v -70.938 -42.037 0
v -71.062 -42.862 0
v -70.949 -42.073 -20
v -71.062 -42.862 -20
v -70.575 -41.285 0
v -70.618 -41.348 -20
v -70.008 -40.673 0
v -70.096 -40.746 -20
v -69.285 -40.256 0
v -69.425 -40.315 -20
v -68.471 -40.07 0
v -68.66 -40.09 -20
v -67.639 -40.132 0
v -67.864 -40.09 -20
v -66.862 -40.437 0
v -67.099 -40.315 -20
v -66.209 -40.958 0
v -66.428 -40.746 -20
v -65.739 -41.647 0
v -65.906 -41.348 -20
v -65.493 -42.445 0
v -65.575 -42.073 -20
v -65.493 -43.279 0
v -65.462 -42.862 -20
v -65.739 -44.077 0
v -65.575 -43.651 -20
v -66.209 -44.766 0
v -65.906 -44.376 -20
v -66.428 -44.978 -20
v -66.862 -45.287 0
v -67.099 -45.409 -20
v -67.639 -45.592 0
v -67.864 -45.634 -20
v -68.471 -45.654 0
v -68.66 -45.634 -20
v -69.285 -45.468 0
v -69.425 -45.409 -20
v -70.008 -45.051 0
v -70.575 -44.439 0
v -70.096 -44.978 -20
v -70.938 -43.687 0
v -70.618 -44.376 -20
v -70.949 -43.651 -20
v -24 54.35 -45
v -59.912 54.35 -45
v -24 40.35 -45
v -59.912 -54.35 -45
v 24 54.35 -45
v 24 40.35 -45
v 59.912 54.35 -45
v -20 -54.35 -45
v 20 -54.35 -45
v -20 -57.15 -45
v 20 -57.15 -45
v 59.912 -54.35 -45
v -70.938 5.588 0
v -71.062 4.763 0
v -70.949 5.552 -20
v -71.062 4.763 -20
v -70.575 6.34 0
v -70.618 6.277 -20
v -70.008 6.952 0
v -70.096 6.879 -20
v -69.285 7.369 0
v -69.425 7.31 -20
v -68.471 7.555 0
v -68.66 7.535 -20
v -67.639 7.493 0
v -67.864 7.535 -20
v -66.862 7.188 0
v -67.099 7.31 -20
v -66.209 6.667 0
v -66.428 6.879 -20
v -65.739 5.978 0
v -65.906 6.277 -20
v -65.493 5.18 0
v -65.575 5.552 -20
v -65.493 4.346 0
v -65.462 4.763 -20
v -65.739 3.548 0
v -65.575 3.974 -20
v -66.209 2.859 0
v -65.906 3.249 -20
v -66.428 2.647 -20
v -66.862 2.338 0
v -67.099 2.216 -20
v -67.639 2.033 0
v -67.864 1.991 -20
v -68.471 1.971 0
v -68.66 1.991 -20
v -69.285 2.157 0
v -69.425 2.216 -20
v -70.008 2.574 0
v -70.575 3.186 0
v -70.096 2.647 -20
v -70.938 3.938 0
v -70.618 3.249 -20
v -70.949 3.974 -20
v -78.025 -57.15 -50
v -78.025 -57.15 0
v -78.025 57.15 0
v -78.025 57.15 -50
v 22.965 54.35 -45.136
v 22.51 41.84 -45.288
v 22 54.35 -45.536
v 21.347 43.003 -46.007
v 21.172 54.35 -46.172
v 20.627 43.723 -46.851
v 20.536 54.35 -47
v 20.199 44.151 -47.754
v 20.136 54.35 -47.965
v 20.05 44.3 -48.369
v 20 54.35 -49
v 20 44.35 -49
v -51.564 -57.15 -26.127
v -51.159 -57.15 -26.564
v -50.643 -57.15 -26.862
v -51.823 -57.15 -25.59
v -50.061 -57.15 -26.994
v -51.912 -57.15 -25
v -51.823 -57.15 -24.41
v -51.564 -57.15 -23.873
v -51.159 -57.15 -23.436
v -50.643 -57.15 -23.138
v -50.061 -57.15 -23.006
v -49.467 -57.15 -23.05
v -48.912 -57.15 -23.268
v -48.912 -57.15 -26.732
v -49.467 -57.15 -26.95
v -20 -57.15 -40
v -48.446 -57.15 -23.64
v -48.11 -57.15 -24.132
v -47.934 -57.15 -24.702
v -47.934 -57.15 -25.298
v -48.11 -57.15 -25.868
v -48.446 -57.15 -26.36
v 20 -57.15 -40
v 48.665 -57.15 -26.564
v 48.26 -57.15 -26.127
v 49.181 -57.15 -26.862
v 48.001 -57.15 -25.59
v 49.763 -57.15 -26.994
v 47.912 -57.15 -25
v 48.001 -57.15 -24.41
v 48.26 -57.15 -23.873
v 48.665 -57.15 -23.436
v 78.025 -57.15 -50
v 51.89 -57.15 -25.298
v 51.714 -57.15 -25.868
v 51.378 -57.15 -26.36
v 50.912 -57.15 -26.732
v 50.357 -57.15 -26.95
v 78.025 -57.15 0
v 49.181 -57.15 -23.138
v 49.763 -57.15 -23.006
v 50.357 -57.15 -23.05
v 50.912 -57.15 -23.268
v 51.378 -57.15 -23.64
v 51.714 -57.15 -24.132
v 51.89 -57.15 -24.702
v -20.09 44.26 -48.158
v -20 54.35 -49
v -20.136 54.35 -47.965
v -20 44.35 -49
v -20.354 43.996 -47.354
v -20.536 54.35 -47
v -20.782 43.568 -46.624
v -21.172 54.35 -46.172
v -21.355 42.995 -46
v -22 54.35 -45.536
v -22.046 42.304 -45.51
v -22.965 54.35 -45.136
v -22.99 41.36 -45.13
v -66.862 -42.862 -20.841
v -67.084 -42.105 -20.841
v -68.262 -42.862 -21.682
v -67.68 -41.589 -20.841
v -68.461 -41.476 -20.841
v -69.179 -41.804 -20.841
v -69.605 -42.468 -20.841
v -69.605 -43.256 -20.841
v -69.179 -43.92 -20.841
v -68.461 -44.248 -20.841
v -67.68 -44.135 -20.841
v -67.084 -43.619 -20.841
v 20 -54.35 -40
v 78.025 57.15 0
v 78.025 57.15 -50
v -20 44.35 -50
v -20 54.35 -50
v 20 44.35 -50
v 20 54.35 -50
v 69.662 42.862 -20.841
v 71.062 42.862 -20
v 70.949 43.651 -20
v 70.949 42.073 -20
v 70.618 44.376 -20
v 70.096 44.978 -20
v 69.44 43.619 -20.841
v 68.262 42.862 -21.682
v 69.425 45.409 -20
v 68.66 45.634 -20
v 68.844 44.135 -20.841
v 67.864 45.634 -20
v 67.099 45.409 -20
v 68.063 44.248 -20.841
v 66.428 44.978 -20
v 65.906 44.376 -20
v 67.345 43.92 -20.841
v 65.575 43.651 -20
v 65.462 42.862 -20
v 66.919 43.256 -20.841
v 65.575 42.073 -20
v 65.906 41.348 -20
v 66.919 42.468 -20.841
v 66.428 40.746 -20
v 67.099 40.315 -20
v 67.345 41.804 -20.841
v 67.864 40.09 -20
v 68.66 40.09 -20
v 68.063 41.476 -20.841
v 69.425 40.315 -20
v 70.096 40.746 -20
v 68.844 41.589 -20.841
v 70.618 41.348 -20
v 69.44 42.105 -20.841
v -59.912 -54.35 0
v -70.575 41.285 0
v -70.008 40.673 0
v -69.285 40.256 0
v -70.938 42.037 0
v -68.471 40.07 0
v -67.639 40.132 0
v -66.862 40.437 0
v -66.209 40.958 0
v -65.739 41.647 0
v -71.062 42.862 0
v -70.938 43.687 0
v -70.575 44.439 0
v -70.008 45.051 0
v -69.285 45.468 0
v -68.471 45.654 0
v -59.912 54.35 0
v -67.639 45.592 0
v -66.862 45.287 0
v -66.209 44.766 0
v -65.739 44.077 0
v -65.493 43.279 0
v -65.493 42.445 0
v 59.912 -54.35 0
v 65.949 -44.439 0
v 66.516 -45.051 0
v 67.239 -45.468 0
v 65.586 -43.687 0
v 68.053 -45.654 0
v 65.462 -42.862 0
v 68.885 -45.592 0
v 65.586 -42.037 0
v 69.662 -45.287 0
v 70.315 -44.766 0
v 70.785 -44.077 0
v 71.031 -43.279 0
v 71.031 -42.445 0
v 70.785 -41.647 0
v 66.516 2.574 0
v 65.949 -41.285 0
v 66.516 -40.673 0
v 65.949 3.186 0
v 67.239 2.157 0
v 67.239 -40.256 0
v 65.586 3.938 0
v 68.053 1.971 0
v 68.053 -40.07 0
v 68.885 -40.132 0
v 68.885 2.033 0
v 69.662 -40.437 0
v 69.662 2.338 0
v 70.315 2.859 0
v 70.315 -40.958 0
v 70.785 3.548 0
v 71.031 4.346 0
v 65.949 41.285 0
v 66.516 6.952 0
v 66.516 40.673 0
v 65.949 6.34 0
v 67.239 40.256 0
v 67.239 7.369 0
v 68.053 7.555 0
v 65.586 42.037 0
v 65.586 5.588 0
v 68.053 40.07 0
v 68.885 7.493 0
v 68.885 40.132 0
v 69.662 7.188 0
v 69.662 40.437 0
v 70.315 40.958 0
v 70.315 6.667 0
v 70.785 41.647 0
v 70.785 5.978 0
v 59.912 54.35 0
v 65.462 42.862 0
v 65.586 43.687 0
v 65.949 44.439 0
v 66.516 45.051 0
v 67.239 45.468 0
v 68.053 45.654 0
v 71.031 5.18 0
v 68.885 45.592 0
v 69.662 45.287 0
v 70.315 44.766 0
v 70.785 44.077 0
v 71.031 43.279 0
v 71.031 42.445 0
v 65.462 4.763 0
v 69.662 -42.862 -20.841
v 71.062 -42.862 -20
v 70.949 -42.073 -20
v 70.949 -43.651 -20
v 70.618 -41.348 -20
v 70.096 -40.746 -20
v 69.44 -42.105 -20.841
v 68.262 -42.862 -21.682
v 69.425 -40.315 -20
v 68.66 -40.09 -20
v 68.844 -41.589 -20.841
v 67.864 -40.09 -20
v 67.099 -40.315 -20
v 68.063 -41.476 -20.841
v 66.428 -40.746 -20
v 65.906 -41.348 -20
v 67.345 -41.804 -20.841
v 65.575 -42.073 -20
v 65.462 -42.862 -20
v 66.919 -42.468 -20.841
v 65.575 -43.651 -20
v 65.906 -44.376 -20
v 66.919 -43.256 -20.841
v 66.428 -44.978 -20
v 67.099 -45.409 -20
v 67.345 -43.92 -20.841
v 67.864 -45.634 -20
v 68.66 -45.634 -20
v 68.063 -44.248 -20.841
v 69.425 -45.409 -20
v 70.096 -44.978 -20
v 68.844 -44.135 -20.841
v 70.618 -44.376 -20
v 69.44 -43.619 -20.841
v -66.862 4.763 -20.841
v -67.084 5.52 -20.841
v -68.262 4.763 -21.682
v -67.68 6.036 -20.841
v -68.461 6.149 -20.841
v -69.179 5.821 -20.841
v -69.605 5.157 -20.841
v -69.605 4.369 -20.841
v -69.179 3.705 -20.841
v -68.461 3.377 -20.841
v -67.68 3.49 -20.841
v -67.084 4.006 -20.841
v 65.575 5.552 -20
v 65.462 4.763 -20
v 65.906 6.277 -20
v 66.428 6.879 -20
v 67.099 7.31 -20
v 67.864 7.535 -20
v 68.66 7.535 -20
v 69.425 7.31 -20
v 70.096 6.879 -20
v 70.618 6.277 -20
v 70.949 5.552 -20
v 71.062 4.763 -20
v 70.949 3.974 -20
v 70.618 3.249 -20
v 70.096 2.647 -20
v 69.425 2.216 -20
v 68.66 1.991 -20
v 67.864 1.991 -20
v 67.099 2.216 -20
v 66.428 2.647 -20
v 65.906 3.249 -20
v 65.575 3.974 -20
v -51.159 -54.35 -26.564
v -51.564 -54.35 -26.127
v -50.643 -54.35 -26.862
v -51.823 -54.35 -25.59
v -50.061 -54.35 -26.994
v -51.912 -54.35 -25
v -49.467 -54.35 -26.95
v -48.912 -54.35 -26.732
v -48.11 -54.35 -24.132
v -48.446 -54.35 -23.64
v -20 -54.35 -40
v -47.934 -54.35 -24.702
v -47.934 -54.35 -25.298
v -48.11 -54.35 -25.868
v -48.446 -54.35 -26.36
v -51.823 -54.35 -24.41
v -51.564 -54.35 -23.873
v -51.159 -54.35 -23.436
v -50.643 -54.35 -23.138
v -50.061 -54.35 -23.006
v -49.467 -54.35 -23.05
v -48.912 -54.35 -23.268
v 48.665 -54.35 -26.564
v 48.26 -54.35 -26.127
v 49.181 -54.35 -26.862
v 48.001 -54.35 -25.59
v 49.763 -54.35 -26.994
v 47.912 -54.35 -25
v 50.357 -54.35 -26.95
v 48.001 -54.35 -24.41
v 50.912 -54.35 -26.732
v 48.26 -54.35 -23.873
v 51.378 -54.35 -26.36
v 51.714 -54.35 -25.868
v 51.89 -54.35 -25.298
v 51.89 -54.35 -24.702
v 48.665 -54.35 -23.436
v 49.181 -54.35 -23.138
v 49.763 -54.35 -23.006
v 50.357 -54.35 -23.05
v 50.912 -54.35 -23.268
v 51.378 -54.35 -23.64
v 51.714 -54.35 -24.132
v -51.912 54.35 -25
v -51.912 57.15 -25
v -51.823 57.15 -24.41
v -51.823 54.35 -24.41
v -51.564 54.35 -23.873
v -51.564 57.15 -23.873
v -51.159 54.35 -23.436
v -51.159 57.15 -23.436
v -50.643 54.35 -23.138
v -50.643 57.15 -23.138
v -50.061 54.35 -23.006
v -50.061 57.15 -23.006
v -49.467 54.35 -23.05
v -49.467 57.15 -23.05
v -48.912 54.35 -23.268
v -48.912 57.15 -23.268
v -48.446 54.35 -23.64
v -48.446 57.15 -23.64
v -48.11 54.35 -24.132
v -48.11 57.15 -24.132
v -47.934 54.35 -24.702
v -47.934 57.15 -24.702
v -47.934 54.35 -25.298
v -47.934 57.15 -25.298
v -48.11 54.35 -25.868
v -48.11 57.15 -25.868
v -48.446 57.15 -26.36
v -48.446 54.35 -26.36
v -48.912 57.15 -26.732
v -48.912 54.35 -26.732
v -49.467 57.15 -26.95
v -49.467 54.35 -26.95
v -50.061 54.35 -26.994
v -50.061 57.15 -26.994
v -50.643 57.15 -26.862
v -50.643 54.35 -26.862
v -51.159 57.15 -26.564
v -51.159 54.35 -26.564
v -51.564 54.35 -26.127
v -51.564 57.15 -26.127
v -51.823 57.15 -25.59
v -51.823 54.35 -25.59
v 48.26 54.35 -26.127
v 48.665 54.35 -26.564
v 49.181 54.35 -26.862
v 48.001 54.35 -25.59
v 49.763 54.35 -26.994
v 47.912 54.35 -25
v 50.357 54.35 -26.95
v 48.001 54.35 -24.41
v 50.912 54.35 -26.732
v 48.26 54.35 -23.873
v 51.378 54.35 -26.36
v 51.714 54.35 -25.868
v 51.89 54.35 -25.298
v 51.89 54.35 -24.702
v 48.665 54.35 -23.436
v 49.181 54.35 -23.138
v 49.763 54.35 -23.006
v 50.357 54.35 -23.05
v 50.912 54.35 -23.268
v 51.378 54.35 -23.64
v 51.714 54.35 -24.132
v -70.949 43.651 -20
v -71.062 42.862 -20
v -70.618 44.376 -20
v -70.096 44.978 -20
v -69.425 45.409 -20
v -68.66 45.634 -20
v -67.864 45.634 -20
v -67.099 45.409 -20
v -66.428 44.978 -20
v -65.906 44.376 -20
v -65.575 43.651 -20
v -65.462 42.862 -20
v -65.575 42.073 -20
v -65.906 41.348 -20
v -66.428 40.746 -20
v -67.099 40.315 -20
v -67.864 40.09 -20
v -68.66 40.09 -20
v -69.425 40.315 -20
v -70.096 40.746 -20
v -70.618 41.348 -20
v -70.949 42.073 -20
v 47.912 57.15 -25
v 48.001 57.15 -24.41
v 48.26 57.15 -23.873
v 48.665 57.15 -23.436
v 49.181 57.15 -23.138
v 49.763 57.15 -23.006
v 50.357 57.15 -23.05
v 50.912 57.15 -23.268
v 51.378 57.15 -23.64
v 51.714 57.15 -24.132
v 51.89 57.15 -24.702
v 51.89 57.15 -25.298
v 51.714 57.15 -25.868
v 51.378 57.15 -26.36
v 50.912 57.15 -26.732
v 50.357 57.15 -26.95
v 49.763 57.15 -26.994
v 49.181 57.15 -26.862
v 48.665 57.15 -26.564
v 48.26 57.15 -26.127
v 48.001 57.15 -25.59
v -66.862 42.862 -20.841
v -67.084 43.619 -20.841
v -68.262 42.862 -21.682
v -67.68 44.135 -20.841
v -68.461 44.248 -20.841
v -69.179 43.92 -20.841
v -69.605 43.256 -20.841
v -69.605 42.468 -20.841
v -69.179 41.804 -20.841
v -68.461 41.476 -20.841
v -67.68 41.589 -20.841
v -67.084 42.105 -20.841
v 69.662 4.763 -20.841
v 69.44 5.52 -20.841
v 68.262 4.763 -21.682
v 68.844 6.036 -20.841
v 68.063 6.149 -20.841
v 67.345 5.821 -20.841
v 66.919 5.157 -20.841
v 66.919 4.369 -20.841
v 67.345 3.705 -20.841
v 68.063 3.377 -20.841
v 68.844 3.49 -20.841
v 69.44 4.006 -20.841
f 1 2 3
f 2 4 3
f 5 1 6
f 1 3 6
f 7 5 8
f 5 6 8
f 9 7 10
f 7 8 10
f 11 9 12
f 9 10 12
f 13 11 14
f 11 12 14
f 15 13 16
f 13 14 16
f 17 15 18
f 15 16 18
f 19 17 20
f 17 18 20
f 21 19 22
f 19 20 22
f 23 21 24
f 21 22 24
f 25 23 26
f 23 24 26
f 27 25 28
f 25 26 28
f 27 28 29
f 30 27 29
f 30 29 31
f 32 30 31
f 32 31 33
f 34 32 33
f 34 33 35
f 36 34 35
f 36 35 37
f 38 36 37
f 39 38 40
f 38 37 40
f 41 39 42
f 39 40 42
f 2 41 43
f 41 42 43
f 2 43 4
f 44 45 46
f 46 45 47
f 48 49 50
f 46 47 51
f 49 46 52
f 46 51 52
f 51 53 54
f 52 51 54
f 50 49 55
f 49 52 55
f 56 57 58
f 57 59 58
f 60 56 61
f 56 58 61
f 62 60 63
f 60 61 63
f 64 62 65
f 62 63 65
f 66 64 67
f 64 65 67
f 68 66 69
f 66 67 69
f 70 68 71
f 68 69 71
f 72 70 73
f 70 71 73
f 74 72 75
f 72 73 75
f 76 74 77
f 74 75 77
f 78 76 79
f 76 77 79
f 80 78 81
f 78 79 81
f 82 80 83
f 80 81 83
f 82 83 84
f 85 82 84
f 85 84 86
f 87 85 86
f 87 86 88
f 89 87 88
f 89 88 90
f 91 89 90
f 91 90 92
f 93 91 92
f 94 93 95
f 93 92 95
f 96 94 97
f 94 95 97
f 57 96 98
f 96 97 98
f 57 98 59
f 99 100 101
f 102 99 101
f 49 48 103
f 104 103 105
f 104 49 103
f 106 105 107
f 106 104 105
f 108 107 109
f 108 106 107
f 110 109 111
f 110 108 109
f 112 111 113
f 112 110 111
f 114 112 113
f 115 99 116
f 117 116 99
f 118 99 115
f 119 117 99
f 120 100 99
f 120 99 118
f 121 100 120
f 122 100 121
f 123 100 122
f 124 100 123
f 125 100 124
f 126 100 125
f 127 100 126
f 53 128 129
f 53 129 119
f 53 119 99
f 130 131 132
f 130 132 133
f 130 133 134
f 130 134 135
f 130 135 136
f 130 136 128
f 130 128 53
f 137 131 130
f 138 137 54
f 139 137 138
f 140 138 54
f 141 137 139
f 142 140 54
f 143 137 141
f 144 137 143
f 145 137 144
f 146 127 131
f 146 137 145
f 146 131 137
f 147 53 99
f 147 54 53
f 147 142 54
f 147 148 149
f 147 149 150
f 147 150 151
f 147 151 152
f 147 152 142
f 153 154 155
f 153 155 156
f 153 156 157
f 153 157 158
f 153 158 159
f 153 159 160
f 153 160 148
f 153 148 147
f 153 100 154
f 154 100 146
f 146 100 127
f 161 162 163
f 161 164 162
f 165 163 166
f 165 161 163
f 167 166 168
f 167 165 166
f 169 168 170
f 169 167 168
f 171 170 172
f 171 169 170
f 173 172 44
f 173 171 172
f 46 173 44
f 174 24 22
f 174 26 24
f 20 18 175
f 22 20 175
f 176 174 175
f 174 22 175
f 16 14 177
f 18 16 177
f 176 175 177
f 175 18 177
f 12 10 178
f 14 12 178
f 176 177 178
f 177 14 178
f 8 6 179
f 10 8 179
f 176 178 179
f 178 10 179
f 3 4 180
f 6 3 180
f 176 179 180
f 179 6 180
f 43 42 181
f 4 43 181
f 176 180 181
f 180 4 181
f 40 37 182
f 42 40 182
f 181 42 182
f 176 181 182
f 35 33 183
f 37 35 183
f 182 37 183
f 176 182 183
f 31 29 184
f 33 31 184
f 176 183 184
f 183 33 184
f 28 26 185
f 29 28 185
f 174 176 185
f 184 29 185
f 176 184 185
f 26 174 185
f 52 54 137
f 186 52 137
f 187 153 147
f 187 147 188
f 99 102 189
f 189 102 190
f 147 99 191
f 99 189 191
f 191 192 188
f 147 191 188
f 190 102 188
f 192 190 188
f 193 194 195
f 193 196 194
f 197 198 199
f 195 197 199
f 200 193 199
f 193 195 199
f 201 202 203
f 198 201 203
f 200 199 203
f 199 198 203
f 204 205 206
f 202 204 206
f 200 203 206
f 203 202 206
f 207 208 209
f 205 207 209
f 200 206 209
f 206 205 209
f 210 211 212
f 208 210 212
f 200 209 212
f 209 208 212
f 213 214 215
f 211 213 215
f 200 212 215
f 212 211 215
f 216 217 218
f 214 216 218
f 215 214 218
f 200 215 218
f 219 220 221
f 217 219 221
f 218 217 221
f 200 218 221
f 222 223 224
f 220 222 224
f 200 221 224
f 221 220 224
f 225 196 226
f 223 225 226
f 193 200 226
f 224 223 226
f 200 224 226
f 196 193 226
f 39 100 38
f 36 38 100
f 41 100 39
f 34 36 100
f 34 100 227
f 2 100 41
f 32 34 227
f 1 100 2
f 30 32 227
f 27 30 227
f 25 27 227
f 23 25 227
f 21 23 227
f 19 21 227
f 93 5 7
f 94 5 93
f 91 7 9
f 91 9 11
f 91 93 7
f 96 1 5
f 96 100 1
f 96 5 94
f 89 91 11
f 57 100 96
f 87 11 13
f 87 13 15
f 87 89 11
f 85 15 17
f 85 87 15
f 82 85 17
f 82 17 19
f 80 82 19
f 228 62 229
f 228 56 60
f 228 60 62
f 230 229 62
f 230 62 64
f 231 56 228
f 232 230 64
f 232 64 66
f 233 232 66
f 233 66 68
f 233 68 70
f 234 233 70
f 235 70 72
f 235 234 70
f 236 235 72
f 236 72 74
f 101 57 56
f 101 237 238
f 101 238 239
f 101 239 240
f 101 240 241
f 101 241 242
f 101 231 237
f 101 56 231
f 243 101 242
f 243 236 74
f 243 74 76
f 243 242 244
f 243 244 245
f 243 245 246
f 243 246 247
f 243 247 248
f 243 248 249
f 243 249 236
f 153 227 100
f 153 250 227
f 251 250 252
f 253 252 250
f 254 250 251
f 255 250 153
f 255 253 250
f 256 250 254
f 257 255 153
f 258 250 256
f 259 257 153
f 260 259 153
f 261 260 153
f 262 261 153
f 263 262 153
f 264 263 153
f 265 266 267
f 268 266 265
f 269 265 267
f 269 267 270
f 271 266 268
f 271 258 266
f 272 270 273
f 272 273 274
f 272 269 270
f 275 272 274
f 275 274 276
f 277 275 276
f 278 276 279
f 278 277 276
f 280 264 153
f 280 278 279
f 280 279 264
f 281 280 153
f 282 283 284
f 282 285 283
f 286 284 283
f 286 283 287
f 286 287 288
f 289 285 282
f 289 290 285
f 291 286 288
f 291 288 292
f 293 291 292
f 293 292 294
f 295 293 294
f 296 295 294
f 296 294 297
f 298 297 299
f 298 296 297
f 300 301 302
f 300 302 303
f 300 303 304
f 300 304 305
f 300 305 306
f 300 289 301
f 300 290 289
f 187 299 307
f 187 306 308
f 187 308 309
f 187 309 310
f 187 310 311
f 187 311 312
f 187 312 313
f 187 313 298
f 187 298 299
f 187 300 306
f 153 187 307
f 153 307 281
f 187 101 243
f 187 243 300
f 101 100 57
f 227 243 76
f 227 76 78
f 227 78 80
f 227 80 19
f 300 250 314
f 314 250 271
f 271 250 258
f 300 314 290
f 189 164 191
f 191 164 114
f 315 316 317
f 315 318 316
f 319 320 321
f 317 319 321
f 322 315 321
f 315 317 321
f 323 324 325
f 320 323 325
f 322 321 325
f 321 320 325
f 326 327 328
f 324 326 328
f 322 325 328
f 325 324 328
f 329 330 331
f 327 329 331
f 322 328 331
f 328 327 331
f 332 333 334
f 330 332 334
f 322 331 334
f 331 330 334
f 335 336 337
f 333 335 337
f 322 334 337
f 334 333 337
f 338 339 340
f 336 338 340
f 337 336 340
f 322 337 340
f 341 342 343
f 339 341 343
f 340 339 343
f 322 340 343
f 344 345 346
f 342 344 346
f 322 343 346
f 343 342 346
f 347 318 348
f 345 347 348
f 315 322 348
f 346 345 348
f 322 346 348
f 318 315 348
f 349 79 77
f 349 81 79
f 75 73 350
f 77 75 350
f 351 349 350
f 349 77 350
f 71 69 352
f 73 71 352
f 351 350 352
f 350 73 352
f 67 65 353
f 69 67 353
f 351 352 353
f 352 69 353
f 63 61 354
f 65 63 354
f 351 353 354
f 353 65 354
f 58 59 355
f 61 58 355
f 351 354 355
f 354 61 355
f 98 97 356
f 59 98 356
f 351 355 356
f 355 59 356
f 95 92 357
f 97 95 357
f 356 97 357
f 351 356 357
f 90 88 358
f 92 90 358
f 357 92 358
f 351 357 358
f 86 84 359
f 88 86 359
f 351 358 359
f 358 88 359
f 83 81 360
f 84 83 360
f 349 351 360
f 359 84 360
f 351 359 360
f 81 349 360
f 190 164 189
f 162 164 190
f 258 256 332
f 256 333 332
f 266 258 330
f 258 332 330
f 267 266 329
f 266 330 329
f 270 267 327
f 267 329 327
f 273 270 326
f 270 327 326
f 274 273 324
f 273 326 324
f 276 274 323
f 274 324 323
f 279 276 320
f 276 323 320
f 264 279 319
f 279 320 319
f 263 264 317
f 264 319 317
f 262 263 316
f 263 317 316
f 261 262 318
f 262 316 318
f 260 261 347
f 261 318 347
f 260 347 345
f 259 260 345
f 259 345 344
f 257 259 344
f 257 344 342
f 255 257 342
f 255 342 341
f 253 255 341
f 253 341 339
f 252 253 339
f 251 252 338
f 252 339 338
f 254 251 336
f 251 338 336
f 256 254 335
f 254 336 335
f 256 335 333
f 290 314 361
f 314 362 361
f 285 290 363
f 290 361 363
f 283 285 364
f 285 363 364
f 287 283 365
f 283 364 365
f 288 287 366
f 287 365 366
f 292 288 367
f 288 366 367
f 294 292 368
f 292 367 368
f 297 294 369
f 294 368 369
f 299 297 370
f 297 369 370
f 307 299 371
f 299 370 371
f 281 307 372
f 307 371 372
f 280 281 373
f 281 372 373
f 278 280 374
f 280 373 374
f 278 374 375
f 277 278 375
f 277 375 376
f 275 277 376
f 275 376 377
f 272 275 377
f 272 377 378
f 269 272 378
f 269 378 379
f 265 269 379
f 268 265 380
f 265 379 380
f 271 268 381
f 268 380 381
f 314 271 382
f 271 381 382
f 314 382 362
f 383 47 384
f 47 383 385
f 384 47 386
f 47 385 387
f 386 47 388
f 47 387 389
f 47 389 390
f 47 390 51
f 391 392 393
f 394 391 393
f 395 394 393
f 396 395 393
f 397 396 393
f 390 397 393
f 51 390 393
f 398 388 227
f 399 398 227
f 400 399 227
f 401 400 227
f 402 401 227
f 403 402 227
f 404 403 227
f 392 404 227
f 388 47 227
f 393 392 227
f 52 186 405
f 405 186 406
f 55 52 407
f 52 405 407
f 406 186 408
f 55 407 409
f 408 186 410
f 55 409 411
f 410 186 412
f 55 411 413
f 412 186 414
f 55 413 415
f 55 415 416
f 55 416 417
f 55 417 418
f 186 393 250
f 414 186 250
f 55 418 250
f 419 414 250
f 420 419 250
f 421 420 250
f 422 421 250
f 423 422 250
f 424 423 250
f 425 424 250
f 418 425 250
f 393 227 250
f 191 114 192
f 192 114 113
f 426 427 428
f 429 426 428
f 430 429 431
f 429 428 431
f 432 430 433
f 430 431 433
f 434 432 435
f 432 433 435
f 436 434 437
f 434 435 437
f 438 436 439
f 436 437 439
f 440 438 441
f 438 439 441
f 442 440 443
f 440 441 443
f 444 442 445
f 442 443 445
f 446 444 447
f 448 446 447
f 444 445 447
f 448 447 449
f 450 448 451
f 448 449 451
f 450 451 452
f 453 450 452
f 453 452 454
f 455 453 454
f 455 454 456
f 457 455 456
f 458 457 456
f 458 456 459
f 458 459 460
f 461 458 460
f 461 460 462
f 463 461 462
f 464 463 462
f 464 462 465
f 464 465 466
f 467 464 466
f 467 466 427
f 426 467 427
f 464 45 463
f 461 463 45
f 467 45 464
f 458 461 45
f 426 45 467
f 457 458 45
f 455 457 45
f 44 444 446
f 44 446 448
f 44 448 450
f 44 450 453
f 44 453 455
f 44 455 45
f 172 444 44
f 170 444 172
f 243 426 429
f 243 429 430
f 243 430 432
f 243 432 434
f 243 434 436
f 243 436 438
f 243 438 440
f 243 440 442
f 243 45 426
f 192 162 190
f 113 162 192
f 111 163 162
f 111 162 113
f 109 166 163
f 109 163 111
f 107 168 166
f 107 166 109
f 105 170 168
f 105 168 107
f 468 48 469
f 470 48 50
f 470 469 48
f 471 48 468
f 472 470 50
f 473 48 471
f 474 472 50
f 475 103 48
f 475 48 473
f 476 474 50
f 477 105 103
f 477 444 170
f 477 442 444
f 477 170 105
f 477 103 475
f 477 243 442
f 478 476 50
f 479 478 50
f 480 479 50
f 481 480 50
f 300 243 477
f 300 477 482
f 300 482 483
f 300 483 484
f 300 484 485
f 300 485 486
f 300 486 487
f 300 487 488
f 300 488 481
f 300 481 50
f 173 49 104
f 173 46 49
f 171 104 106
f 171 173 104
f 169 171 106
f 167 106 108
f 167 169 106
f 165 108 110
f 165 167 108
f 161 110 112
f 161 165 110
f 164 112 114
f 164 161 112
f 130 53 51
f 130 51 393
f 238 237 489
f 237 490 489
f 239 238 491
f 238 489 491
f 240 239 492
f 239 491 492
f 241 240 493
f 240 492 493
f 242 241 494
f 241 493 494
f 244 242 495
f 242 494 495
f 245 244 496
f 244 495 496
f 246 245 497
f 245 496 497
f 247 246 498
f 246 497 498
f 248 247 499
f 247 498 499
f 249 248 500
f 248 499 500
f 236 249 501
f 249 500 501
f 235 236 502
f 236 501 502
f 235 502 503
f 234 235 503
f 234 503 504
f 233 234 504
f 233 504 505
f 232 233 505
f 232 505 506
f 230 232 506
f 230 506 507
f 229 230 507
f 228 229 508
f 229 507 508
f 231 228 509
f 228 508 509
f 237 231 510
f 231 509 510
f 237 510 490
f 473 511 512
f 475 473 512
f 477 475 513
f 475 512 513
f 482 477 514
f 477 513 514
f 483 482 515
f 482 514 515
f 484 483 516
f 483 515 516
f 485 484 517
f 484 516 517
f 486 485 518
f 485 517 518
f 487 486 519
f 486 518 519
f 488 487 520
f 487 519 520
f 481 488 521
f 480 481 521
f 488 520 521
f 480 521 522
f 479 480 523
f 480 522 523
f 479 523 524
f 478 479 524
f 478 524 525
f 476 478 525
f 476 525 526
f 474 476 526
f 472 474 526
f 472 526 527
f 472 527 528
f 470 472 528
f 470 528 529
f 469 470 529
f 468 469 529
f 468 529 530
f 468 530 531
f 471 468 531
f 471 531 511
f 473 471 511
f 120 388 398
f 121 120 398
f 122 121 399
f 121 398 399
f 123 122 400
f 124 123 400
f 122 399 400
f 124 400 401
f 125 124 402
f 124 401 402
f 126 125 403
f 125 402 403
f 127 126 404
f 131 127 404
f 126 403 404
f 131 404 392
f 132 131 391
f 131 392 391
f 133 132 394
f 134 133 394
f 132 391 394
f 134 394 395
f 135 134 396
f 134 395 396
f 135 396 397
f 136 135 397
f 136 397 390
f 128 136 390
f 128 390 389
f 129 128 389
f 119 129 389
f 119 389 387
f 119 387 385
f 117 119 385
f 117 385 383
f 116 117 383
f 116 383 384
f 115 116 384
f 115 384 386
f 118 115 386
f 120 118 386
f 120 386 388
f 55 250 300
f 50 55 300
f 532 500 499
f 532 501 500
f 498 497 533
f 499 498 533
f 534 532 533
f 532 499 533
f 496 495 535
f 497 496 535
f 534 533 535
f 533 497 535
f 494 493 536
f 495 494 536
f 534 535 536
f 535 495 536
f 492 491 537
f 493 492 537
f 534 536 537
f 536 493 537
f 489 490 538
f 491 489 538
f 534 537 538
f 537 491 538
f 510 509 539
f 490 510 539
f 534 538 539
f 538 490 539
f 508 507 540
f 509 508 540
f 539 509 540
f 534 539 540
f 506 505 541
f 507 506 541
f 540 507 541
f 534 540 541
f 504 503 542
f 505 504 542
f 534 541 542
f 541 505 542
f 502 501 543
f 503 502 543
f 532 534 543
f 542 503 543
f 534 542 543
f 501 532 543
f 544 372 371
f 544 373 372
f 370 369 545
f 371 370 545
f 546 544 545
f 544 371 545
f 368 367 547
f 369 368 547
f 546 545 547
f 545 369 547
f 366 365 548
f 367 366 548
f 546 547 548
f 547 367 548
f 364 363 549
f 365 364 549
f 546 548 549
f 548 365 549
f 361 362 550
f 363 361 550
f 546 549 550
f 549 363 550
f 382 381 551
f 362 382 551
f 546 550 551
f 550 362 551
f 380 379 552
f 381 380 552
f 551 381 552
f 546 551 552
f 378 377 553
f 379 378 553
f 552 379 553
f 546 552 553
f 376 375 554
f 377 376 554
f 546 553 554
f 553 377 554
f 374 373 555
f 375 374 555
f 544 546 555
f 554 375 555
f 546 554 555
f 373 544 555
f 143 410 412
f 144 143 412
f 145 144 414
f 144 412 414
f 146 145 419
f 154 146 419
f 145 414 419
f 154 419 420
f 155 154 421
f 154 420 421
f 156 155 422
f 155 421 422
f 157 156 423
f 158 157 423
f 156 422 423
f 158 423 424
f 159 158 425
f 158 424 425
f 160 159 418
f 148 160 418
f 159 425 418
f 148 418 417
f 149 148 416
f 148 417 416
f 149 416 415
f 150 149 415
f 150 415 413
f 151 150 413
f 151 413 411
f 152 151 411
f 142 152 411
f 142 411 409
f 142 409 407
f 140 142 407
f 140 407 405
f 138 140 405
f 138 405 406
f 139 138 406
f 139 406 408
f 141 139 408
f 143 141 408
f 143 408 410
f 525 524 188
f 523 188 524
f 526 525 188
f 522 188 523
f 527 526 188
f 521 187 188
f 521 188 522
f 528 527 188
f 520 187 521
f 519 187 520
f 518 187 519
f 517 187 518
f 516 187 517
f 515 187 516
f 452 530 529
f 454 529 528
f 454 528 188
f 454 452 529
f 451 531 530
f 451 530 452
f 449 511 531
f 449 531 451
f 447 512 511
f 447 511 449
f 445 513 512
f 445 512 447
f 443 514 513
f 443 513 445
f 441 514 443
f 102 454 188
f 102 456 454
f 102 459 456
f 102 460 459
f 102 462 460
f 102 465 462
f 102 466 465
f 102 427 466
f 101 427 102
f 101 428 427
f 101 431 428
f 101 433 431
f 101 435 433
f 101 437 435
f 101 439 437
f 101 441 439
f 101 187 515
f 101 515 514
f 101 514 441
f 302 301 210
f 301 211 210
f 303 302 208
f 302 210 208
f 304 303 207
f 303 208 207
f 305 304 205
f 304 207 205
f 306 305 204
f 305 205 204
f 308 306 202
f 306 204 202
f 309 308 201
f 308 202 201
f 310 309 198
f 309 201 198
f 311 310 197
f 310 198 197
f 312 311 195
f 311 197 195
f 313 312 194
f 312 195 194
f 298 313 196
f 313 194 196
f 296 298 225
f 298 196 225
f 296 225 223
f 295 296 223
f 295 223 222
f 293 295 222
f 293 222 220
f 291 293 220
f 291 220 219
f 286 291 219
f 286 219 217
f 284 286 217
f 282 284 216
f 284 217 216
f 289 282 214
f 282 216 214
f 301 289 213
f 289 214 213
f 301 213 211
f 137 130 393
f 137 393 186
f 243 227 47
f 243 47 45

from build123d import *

# Parameters (mm, degrees)
F0_W     = 146.05
F0_H     = 114.3
F0_R     = 3.24
F0_W_2   = 5
F1_DEPTH = 50
F2_W     = 119.824
F2_H     = 108.7
F3_DEPTH = 45
F4_D     = 5.6
F4_DEPTH = 20
F4_TIP   = 1.6824097333
F5_W     = 40
F5_H     = 5
F6_DEPTH = 2.8
F7_D     = 4
F8_W     = 40
F8_H     = 10
F9_DEPTH = 50.001
F10_R    = 4


with BuildPart() as f1:
    # F0 (on Top) → F1 (new body)
    with BuildSketch(Plane.XY):
        Rectangle(F0_W, F0_H)
        with Locations((-68.262, -42.862)):
            Circle(F0_R, mode=Mode.SUBTRACT)
        with Locations((68.262, -42.862)):
            Circle(F0_R, mode=Mode.SUBTRACT)
        with Locations((-68.262, 4.763)):
            Circle(F0_R, mode=Mode.SUBTRACT)
        with BuildLine():
            Line((-72.225, -1.587), (-68.262, -1.587))
            ThreePointArc((-68.262, -1.587), (-61.912, 4.763), (-68.262, 11.113))
            Line((-68.262, 11.113), (-72.225, 11.113))
            Line((-72.225, 11.113), (-72.225, 36.512))
            Line((-72.225, 36.512), (-68.262, 36.512))
            ThreePointArc((-68.262, 36.512), (-61.912, 42.862), (-68.262, 49.212))
            Line((-68.262, 49.212), (-72.225, 49.212))
            Line((-72.225, 49.212), (-72.225, 56.35))
            Line((-72.225, 56.35), (72.225, 56.35))
            Line((72.225, 56.35), (72.225, 49.212))
            Line((72.225, 49.212), (68.262, 49.212))
            ThreePointArc((68.262, 49.212), (61.912, 42.862), (68.262, 36.512))
            Line((68.262, 36.512), (72.225, 36.512))
            Line((72.225, 36.512), (72.225, 11.113))
            Line((72.225, 11.113), (68.262, 11.113))
            ThreePointArc((68.262, 11.113), (61.912, 4.763), (68.262, -1.587))
            Line((68.262, -1.587), (72.225, -1.587))
            Line((72.225, -1.587), (72.225, -36.512))
            Line((72.225, -36.512), (68.262, -36.512))
            ThreePointArc((68.262, -36.512), (61.912, -42.862), (68.262, -49.212))
            Line((68.262, -49.212), (72.225, -49.212))
            Line((72.225, -49.212), (72.225, -56.35))
            Line((72.225, -56.35), (-72.225, -56.35))
            Line((-72.225, -56.35), (-72.225, -49.212))
            Line((-72.225, -49.212), (-68.262, -49.212))
            ThreePointArc((-68.262, -49.212), (-61.912, -42.862), (-68.262, -36.512))
            Line((-68.262, -36.512), (-72.225, -36.512))
            Line((-72.225, -36.512), (-72.225, -1.587))
        make_face(mode=Mode.SUBTRACT)
        with Locations((-68.262, 42.862)):
            Circle(F0_R, mode=Mode.SUBTRACT)
        with Locations((68.262, 4.763)):
            Circle(F0_R, mode=Mode.SUBTRACT)
        with Locations((68.262, 42.862)):
            Circle(F0_R, mode=Mode.SUBTRACT)
        with Locations((75.525, 0)):
            Rectangle(F0_W_2, F0_H)
        with Locations((-75.525, 0)):
            Rectangle(F0_W_2, F0_H)
        with Locations((-68.262, 4.763)):
            Circle(F0_R)
        with Locations((-68.262, 42.862)):
            Circle(F0_R)
        with Locations((68.262, 42.862)):
            Circle(F0_R)
        with BuildLine():
            ThreePointArc((-68.262, 11.113), (-61.912, 4.763), (-68.262, -1.587))
            Line((-68.262, -1.587), (-72.225, -1.587))
            Line((-72.225, -1.587), (-72.225, -36.512))
            Line((-72.225, -36.512), (-68.262, -36.512))
            ThreePointArc((-68.262, -36.512), (-61.912, -42.862), (-68.262, -49.212))
            Line((-68.262, -49.212), (-72.225, -49.212))
            Line((-72.225, -49.212), (-72.225, -56.35))
            Line((-72.225, -56.35), (72.225, -56.35))
            Line((72.225, -56.35), (72.225, -49.212))
            Line((72.225, -49.212), (68.262, -49.212))
            ThreePointArc((68.262, -49.212), (61.912, -42.862), (68.262, -36.512))
            Line((68.262, -36.512), (72.225, -36.512))
            Line((72.225, -36.512), (72.225, -1.587))
            Line((72.225, -1.587), (68.262, -1.587))
            ThreePointArc((68.262, -1.587), (61.912, 4.763), (68.262, 11.113))
            Line((68.262, 11.113), (72.225, 11.113))
            Line((72.225, 11.113), (72.225, 36.512))
            Line((72.225, 36.512), (68.262, 36.512))
            ThreePointArc((68.262, 36.512), (61.912, 42.862), (68.262, 49.212))
            Line((68.262, 49.212), (72.225, 49.212))
            Line((72.225, 49.212), (72.225, 56.35))
            Line((72.225, 56.35), (-72.225, 56.35))
            Line((-72.225, 56.35), (-72.225, 49.212))
            Line((-72.225, 49.212), (-68.262, 49.212))
            ThreePointArc((-68.262, 49.212), (-61.912, 42.862), (-68.262, 36.512))
            Line((-68.262, 36.512), (-72.225, 36.512))
            Line((-72.225, 36.512), (-72.225, 11.113))
            Line((-72.225, 11.113), (-68.262, 11.113))
        make_face()
        with Locations((68.262, 4.763)):
            Circle(F0_R)
        with Locations((68.262, -42.862)):
            Circle(F0_R)
        with Locations((-68.262, -42.862)):
            Circle(F0_R)
    extrude(amount=-F1_DEPTH)

    # F2 (on face) → F3 (cut)
    with BuildSketch(Plane.XY):
        Rectangle(F2_W, F2_H)
    extrude(amount=-F3_DEPTH, mode=Mode.SUBTRACT)

    # F4
    with Locations(Plane.XY):
        with Locations((-68.262, 42.862), (-68.262, 4.763), (-68.262, -42.862), (68.262, -42.862), (68.262, 4.763), (68.262, 42.862)):
            Hole(F4_D / 2, depth=F4_DEPTH)
            with Locations((0, 0, -(F4_DEPTH + F4_TIP / 2))):  # 118° drill point
                Cone(0, F4_D / 2, F4_TIP, mode=Mode.SUBTRACT)

    # F5 (on face) → F6 (cut, through all)
    with BuildSketch(Plane.XZ.offset(57.15)):
        with Locations((0, -42.5)):
            Rectangle(F5_W, F5_H)
    extrude(amount=-F6_DEPTH, mode=Mode.SUBTRACT)

    # F7 (through all)
    with Locations(Plane.XZ.offset(57.15)):
        with Locations((-49.912, -25), (49.912, -25)):
            Hole(F7_D / 2)

    # F8 (on face) → F9 (cut, through all)
    with BuildSketch(Plane.XY):
        with Locations((0, 49.35)):
            Rectangle(F8_W, F8_H)
    extrude(amount=-F9_DEPTH, mode=Mode.SUBTRACT)

    # F10
    f10_edges = [f1.edges().sort_by_distance(p)[0] for p in [
        (-20, 49.35, -45),
        (0, 44.35, -45),
        (20, 49.35, -45),
    ]]
    fillet(f10_edges, radius=F10_R)


solid = f1.part
